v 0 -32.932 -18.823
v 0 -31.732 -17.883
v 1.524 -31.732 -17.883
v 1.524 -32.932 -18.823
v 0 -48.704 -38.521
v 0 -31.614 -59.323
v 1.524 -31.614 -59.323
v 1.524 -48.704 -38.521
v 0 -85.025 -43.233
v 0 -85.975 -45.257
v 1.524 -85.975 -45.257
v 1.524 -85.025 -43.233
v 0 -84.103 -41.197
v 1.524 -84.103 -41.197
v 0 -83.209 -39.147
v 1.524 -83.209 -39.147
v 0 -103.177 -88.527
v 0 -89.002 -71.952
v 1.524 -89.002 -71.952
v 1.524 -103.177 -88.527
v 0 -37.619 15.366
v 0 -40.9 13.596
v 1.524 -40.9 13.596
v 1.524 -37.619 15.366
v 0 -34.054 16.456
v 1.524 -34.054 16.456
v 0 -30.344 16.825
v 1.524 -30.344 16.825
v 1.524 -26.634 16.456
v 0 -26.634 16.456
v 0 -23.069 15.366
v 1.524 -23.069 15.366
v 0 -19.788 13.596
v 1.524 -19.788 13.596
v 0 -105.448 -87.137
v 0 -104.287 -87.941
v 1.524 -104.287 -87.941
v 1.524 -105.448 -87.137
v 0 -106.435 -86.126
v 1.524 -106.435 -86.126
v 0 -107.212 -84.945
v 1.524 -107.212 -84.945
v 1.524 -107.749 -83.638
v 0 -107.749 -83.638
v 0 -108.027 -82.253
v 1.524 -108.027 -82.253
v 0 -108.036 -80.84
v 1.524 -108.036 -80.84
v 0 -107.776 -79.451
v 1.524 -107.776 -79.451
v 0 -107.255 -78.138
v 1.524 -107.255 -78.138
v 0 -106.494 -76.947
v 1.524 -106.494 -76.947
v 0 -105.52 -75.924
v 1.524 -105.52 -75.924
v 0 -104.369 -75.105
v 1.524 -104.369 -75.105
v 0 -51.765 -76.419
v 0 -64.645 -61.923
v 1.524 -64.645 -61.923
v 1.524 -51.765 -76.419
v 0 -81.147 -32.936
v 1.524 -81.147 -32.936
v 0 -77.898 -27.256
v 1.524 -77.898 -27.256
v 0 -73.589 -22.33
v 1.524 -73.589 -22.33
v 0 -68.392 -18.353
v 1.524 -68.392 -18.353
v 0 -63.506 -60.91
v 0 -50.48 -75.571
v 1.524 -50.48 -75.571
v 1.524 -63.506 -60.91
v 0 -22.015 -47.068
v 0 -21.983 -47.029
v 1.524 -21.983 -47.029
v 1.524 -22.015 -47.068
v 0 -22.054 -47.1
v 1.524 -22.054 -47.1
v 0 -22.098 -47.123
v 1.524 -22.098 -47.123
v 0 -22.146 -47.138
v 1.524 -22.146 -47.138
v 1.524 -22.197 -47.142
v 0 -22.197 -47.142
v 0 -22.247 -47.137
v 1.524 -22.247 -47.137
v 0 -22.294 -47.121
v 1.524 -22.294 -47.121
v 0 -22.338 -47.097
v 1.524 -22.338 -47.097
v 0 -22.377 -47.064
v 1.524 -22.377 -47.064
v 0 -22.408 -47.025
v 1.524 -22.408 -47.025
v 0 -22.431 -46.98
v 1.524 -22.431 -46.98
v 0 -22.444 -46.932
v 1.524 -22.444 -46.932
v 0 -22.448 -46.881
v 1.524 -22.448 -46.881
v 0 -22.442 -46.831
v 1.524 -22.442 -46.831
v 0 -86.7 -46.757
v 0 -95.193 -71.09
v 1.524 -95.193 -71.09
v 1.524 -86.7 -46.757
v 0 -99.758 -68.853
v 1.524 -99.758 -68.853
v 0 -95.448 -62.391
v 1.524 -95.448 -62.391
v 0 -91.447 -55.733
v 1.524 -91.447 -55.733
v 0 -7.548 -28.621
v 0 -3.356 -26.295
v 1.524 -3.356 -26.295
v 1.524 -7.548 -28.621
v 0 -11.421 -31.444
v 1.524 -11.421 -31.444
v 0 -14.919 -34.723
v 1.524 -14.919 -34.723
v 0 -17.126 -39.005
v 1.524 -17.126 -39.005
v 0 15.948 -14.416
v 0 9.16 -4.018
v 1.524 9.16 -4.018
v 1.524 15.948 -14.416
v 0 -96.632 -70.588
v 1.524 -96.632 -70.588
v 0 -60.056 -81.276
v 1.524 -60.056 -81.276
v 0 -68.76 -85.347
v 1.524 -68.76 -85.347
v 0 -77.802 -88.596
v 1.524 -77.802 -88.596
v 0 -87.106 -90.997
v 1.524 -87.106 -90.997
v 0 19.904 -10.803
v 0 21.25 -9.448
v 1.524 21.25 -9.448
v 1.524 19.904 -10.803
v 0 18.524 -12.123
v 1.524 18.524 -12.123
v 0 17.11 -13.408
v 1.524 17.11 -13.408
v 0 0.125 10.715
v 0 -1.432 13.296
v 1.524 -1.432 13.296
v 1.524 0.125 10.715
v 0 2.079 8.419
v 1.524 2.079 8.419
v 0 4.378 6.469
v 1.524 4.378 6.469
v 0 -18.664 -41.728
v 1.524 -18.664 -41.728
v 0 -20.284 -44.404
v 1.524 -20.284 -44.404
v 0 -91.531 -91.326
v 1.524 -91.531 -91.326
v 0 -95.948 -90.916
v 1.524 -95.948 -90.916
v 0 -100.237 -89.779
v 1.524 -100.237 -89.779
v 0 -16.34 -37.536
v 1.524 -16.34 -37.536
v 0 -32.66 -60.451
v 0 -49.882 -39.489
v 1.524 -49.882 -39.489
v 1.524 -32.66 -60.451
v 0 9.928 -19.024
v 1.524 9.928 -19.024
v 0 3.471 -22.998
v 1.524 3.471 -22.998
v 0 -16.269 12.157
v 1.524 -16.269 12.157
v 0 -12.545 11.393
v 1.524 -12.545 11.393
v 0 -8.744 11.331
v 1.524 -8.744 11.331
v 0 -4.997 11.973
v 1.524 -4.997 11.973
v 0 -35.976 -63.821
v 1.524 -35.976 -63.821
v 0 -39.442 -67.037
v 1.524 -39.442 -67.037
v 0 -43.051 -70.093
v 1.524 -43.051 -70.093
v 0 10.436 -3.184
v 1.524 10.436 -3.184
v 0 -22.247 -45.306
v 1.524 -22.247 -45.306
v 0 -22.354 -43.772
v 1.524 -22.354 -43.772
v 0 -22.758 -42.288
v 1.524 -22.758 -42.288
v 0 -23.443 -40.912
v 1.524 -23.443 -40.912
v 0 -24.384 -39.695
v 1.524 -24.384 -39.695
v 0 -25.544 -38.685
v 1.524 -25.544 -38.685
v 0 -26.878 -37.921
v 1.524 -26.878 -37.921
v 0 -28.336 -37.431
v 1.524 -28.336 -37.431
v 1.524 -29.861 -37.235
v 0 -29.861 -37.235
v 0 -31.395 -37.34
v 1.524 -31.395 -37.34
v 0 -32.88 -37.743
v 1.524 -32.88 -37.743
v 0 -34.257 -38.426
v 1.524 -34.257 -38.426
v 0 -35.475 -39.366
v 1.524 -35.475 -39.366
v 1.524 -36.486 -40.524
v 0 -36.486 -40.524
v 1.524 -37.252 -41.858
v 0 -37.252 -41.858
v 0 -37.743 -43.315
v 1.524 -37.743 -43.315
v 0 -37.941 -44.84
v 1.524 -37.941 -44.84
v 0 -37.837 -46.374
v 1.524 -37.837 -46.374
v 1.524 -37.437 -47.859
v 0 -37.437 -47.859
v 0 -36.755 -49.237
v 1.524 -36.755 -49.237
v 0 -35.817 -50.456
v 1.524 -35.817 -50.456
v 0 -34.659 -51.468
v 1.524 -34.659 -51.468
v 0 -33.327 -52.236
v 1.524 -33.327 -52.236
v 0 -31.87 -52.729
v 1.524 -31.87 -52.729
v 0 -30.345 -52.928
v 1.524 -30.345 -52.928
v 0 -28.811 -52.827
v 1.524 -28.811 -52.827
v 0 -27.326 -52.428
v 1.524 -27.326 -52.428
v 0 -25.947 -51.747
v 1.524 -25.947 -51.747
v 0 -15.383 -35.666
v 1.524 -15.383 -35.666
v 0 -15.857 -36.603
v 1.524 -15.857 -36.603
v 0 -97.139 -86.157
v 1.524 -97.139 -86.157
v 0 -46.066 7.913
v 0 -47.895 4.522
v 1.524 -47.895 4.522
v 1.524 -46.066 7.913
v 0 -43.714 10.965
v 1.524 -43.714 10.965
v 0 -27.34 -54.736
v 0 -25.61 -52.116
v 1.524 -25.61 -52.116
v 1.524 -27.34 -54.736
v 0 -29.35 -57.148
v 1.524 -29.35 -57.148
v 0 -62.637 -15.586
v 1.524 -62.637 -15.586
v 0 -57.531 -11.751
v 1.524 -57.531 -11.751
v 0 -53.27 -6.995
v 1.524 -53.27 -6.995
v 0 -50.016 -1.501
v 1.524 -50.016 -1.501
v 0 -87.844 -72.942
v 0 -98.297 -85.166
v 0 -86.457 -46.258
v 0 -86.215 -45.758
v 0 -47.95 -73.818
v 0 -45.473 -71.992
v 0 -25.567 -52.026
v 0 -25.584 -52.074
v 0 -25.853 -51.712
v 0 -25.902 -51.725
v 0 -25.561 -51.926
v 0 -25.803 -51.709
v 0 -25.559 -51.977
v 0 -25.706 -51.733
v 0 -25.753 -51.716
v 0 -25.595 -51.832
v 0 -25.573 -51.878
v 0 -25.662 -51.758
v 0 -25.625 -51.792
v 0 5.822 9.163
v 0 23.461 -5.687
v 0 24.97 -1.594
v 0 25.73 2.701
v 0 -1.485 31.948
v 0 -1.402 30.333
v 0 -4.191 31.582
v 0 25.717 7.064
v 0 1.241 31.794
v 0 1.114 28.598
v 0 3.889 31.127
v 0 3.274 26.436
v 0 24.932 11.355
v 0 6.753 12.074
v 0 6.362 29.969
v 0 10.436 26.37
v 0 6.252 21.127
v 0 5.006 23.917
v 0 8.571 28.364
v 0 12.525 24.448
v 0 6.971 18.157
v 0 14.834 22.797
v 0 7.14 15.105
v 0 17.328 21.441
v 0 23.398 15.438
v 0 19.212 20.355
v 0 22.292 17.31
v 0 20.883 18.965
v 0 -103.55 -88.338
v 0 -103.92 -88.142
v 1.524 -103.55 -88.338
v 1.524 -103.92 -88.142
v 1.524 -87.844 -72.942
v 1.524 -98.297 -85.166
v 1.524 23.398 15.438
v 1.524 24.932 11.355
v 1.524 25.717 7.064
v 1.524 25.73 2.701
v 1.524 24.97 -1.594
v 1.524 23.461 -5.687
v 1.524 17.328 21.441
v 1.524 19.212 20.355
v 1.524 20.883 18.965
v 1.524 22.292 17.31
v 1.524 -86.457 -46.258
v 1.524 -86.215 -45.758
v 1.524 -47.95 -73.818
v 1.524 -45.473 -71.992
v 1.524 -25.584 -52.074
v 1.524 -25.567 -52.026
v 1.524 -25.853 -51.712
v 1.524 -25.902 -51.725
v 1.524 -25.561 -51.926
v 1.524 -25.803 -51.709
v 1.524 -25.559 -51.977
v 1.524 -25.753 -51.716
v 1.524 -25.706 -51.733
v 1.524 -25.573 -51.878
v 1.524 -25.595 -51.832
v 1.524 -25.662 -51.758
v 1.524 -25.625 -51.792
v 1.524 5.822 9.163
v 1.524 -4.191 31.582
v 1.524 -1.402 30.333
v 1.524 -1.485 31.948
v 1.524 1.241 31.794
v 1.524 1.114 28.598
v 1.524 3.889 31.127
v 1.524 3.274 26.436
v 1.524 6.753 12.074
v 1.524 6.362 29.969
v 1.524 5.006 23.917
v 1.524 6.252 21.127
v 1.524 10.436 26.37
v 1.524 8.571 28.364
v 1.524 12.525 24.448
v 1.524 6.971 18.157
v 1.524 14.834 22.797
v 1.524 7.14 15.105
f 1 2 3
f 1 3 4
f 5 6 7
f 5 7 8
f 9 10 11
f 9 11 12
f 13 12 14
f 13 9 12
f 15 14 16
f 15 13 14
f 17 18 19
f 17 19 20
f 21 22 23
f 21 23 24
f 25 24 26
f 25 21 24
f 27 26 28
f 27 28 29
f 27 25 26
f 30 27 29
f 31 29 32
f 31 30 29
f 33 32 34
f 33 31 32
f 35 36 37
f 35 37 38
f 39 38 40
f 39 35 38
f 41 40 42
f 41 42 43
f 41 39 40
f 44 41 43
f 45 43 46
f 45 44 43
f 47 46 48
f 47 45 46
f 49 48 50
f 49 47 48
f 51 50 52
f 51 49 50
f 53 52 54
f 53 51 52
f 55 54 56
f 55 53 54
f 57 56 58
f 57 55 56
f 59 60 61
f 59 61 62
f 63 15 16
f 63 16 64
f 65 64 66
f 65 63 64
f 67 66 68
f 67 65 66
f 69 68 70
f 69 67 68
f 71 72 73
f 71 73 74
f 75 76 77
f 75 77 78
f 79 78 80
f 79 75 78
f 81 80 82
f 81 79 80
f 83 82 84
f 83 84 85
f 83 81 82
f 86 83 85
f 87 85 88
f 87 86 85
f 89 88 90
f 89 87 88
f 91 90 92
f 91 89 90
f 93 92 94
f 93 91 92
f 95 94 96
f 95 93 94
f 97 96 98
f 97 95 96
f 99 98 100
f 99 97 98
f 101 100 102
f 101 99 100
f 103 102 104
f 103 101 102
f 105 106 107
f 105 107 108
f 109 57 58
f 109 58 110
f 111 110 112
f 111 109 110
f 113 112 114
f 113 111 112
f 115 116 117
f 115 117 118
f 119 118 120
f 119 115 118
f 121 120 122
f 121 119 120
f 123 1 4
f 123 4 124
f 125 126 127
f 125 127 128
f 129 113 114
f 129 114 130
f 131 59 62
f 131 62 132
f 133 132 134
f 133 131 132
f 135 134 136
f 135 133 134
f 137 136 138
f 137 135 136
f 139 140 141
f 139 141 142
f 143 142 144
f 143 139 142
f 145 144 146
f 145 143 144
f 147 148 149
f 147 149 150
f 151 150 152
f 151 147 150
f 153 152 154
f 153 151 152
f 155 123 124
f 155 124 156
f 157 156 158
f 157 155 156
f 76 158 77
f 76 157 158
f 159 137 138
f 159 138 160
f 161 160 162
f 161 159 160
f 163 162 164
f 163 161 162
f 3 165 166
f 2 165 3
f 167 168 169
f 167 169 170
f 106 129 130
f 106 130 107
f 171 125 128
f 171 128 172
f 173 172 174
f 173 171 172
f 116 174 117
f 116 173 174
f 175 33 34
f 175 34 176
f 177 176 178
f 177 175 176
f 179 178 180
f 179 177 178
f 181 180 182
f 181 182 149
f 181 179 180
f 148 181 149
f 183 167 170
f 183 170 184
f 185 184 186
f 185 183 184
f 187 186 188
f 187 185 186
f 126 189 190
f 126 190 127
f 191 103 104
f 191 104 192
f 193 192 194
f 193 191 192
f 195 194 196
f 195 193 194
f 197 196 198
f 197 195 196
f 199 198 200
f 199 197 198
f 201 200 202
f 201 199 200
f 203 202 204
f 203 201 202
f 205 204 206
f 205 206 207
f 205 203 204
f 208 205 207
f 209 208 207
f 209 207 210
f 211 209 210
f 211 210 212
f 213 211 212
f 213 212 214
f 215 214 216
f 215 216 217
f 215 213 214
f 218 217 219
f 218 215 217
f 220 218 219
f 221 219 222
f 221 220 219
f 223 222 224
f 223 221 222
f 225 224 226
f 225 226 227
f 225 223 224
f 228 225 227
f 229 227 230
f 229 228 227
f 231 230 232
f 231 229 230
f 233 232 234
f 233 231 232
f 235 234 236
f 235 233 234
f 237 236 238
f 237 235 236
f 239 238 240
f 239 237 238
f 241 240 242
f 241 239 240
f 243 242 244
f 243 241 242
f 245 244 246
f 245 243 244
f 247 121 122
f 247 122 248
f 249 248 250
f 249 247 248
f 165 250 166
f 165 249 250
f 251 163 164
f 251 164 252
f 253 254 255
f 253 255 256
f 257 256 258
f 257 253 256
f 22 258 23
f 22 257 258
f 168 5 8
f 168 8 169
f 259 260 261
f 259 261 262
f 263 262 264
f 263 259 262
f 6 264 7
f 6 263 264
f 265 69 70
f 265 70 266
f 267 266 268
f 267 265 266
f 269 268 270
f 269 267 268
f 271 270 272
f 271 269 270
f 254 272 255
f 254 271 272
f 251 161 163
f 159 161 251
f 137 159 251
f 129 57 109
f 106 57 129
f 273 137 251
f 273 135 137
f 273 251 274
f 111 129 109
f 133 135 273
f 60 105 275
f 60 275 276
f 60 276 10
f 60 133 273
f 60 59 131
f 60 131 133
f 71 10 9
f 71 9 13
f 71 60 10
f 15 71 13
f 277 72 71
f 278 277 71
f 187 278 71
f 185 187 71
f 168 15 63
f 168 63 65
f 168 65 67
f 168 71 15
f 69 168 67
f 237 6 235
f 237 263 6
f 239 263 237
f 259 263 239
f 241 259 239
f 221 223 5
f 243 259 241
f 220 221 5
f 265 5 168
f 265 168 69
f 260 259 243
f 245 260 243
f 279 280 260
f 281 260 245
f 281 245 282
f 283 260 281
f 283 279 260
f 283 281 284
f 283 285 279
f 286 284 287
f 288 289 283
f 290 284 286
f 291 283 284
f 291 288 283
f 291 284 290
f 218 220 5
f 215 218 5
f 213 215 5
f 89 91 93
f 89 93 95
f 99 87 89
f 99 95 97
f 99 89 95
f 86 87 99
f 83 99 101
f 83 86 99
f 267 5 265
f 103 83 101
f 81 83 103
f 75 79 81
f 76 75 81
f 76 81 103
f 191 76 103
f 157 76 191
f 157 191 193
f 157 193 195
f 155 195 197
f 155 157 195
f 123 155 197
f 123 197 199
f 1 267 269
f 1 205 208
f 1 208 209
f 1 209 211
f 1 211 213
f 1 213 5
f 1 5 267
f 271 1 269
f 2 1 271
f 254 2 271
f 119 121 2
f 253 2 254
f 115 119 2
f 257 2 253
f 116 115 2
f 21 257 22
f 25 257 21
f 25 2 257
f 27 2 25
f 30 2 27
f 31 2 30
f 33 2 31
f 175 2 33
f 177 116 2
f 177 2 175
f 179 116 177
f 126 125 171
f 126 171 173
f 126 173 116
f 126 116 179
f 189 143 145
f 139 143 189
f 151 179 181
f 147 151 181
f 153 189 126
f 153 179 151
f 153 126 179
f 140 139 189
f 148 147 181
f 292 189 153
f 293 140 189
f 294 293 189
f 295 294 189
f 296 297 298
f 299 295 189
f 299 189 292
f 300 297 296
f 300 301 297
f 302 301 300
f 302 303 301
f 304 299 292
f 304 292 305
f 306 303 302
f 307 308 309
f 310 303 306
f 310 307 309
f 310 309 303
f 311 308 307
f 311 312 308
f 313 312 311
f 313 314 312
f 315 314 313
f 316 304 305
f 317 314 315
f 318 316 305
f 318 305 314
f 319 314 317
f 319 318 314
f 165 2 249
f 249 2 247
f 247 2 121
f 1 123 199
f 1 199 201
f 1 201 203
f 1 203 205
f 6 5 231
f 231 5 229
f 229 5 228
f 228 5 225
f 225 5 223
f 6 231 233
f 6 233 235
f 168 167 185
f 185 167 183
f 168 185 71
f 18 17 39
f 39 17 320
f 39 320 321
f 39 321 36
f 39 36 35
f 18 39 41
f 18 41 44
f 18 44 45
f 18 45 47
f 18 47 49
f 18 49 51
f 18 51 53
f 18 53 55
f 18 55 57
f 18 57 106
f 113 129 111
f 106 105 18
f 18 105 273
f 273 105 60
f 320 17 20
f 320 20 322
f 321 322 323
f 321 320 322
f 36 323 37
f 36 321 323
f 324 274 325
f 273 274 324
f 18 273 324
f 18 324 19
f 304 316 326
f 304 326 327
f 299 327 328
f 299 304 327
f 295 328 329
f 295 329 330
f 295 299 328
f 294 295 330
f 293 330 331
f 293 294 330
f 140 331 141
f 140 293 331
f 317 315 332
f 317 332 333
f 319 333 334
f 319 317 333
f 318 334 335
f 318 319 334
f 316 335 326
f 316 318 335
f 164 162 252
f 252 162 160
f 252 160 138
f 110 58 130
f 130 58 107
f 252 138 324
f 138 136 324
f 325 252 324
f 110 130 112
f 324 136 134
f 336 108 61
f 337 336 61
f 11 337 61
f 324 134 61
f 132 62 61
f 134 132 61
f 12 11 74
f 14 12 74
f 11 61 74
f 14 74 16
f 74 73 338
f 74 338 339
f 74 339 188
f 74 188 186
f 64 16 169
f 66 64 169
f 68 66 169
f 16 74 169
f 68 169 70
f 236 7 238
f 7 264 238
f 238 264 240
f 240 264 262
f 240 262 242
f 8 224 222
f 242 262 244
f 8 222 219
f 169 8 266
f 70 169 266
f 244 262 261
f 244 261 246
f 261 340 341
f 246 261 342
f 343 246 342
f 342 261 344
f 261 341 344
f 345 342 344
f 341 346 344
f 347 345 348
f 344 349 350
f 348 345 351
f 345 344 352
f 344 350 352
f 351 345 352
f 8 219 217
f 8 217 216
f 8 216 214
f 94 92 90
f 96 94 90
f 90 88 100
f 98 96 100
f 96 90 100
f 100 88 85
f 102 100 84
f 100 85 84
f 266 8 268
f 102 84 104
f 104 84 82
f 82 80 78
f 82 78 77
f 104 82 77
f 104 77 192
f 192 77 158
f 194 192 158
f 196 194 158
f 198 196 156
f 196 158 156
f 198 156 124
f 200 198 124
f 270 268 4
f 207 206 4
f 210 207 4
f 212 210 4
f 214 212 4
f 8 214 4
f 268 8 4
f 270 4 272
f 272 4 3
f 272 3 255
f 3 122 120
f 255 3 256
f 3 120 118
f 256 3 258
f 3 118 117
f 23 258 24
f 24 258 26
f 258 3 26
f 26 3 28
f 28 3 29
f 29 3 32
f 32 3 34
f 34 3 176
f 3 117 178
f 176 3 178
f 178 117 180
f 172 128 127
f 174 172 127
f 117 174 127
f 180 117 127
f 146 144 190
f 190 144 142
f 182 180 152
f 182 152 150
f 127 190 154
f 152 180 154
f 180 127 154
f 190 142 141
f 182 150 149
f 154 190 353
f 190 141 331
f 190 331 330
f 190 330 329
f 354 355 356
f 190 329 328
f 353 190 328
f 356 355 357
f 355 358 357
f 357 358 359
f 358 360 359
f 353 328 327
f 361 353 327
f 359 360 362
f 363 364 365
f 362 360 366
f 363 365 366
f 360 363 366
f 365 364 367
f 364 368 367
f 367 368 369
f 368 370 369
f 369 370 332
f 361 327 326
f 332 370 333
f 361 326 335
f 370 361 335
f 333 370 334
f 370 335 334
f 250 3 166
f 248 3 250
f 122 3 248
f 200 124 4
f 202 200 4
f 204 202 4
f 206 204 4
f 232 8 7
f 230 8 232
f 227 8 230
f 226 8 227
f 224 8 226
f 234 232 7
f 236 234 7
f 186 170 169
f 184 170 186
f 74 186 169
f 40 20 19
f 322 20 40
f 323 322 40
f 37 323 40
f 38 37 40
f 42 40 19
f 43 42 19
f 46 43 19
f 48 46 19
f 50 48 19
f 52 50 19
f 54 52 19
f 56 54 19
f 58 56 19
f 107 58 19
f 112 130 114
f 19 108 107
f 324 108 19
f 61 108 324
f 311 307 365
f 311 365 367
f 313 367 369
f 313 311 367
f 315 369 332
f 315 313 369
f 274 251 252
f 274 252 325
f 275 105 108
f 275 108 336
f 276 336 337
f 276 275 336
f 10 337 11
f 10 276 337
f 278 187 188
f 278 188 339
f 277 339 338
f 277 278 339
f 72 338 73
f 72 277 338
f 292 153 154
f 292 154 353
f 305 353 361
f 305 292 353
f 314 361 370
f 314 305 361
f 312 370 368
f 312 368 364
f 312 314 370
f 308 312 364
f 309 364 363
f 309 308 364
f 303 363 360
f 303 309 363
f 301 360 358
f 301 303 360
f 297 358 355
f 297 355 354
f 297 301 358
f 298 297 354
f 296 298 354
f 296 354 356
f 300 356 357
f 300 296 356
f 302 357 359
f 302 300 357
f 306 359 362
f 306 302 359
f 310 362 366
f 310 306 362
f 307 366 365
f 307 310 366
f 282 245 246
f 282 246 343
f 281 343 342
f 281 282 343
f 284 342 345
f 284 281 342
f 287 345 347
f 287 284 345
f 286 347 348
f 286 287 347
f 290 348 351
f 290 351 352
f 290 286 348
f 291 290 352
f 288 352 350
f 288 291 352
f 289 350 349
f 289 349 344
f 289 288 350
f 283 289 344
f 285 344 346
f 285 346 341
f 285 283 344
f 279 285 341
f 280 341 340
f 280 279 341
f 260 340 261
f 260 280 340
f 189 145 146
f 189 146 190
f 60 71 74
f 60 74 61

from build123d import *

# Parameters (mm, degrees)
BOSS_EXTRUDE1_DEPTH = 1.524


with BuildPart() as part:
    # Sketch1 → Boss-Extrude1 (new body)
    with BuildSketch(Plane(origin=(0, 0, 0), x_dir=(0, 0, -1), z_dir=(1, 0, 0))):
        with BuildLine():
            Line((13.407652518, 17.110478898), (3.184449025, 10.435661085))
            Line((3.184449025, 10.435661085), (4.017618802, 9.159571698))
            Line((4.017618802, 9.159571698), (14.415583003, 15.948492286))
            ThreePointArc((14.415583003, 15.948492286), (21.092922372, 6.750259445), (26.29476658, -3.355934957))
            ThreePointArc((26.29476658, -3.355934957), (29.972883945, -9.528005236), (34.723111664, -14.918583638))
            ThreePointArc((34.723111664, -14.918583638), (36.135111524, -15.61884561), (37.536333073, -16.340433168))
            Line((37.536333073, -16.340433168), (17.883159134, -31.731702551))
            Line((17.883159134, -31.731702551), (18.82281135, -32.931548254))
            Line((18.82281135, -32.931548254), (39.005018059, -17.125969921))
            ThreePointArc((39.005018059, -17.125969921), (43.071954568, -19.463822973), (47.029287435, -21.982760456))
            ThreePointArc((47.029287435, -21.982760456), (47.121340823, -22.294468188), (46.831491474, -22.44151543))
            ThreePointArc((46.831491474, -22.44151543), (40.524268055, -36.485757729), (51.747180655, -25.946875351))
            ThreePointArc((51.747180655, -25.946875351), (51.79176687, -25.624931868), (52.116458195, -25.610403262))
            ThreePointArc((52.116458195, -25.610403262), (55.970170844, -28.311608841), (59.322656596, -31.614403422))
            Line((59.322656596, -31.614403422), (38.521293058, -48.704406988))
            Line((38.521293058, -48.704406988), (39.48874306, -49.8819538))
            Line((39.48874306, -49.8819538), (60.451087926, -32.659691044))
            ThreePointArc((60.451087926, -32.659691044), (65.449164438, -37.690671834), (70.092626303, -43.050690343))
            ThreePointArc((70.092626303, -43.050690343), (72.914169877, -46.704495979), (75.570723168, -50.479959972))
            Line((75.570723168, -50.479959972), (60.910405453, -63.506128463))
            Line((60.910405453, -63.506128463), (61.922669103, -64.64538186))
            Line((61.922669103, -64.64538186), (76.419081079, -51.764848943))
            ThreePointArc((76.419081079, -51.764848943), (85.346593392, -68.759689082), (90.997112415, -87.10626103))
            ThreePointArc((90.997112415, -87.10626103), (91.213266354, -93.748148771), (89.779086784, -100.23694868))
            Line((89.779086784, -100.23694868), (86.156676546, -97.139104436))
            Line((86.156676546, -97.139104436), (85.16617589, -98.297329135))
            Line((85.16617589, -98.297329135), (72.942235832, -87.843553926))
            Line((72.942235832, -87.843553926), (71.951735177, -89.001778624))
            Line((71.951735177, -89.001778624), (88.527211746, -103.176938614))
            ThreePointArc((88.527211746, -103.176938614), (88.240593298, -103.735184094), (87.940907668, -104.286524891))
            ThreePointArc((87.940907668, -104.286524891), (81.546731579, -108.065445103), (75.104666757, -104.368753791))
            ThreePointArc((75.104666757, -104.368753791), (65.647792617, -97.564665833), (55.732787106, -91.447415868))
            Line((55.732787106, -91.447415868), (70.587569953, -96.632218566))
            Line((70.587569953, -96.632218566), (71.089783687, -95.193344922))
            Line((71.089783687, -95.193344922), (46.757147713, -86.700463003))
            ThreePointArc((46.757147713, -86.700463003), (46.008174549, -86.335839826), (45.257363435, -85.975016415))
            ThreePointArc((45.257363435, -85.975016415), (42.216480057, -84.561010059), (39.14738639, -83.209326015))
            ThreePointArc((39.14738639, -83.209326015), (27.255727661, -77.897933177), (18.352985242, -68.39195513))
            ThreePointArc((18.352985242, -68.39195513), (9.477657224, -55.283796186), (-4.522491883, -47.89521694))
            ThreePointArc((-4.522491883, -47.89521694), (-9.486665924, -44.951872039), (-13.595983785, -40.899735587))
            ThreePointArc((-13.595983785, -40.899735587), (-16.824505318, -30.34398814), (-13.595983785, -19.788240693))
            ThreePointArc((-13.595983785, -19.788240693), (-11.273947375, -10.645865952), (-13.295774557, -1.432447268))
            ThreePointArc((-13.295774557, -1.432447268), (-9.527302248, 1.055622975), (-6.46891992, 4.377997821))
            ThreePointArc((-6.46891992, 4.377997821), (-21.126971598, 6.251882407), (-31.581931465, -4.191476087))
            ThreePointArc((-31.581931465, -4.191476087), (-31.126828301, 3.888628011), (-26.369564479, 10.435661085))
            ThreePointArc((-26.369564479, 10.435661085), (-23.587438274, 13.654628259), (-21.440611016, 17.327924955))
            ThreePointArc((-21.440611016, 17.327924955), (-18.964873682, 20.882521181), (-15.438488132, 23.398278447))
            ThreePointArc((-15.438488132, 23.398278447), (-2.701283032, 25.730330795), (9.447763641, 21.249758643))
            ThreePointArc((9.447763641, 21.249758643), (11.467468523, 19.218156049), (13.407652518, 17.110478898))
        make_face()
    extrude(amount=BOSS_EXTRUDE1_DEPTH)


solid = part.part
